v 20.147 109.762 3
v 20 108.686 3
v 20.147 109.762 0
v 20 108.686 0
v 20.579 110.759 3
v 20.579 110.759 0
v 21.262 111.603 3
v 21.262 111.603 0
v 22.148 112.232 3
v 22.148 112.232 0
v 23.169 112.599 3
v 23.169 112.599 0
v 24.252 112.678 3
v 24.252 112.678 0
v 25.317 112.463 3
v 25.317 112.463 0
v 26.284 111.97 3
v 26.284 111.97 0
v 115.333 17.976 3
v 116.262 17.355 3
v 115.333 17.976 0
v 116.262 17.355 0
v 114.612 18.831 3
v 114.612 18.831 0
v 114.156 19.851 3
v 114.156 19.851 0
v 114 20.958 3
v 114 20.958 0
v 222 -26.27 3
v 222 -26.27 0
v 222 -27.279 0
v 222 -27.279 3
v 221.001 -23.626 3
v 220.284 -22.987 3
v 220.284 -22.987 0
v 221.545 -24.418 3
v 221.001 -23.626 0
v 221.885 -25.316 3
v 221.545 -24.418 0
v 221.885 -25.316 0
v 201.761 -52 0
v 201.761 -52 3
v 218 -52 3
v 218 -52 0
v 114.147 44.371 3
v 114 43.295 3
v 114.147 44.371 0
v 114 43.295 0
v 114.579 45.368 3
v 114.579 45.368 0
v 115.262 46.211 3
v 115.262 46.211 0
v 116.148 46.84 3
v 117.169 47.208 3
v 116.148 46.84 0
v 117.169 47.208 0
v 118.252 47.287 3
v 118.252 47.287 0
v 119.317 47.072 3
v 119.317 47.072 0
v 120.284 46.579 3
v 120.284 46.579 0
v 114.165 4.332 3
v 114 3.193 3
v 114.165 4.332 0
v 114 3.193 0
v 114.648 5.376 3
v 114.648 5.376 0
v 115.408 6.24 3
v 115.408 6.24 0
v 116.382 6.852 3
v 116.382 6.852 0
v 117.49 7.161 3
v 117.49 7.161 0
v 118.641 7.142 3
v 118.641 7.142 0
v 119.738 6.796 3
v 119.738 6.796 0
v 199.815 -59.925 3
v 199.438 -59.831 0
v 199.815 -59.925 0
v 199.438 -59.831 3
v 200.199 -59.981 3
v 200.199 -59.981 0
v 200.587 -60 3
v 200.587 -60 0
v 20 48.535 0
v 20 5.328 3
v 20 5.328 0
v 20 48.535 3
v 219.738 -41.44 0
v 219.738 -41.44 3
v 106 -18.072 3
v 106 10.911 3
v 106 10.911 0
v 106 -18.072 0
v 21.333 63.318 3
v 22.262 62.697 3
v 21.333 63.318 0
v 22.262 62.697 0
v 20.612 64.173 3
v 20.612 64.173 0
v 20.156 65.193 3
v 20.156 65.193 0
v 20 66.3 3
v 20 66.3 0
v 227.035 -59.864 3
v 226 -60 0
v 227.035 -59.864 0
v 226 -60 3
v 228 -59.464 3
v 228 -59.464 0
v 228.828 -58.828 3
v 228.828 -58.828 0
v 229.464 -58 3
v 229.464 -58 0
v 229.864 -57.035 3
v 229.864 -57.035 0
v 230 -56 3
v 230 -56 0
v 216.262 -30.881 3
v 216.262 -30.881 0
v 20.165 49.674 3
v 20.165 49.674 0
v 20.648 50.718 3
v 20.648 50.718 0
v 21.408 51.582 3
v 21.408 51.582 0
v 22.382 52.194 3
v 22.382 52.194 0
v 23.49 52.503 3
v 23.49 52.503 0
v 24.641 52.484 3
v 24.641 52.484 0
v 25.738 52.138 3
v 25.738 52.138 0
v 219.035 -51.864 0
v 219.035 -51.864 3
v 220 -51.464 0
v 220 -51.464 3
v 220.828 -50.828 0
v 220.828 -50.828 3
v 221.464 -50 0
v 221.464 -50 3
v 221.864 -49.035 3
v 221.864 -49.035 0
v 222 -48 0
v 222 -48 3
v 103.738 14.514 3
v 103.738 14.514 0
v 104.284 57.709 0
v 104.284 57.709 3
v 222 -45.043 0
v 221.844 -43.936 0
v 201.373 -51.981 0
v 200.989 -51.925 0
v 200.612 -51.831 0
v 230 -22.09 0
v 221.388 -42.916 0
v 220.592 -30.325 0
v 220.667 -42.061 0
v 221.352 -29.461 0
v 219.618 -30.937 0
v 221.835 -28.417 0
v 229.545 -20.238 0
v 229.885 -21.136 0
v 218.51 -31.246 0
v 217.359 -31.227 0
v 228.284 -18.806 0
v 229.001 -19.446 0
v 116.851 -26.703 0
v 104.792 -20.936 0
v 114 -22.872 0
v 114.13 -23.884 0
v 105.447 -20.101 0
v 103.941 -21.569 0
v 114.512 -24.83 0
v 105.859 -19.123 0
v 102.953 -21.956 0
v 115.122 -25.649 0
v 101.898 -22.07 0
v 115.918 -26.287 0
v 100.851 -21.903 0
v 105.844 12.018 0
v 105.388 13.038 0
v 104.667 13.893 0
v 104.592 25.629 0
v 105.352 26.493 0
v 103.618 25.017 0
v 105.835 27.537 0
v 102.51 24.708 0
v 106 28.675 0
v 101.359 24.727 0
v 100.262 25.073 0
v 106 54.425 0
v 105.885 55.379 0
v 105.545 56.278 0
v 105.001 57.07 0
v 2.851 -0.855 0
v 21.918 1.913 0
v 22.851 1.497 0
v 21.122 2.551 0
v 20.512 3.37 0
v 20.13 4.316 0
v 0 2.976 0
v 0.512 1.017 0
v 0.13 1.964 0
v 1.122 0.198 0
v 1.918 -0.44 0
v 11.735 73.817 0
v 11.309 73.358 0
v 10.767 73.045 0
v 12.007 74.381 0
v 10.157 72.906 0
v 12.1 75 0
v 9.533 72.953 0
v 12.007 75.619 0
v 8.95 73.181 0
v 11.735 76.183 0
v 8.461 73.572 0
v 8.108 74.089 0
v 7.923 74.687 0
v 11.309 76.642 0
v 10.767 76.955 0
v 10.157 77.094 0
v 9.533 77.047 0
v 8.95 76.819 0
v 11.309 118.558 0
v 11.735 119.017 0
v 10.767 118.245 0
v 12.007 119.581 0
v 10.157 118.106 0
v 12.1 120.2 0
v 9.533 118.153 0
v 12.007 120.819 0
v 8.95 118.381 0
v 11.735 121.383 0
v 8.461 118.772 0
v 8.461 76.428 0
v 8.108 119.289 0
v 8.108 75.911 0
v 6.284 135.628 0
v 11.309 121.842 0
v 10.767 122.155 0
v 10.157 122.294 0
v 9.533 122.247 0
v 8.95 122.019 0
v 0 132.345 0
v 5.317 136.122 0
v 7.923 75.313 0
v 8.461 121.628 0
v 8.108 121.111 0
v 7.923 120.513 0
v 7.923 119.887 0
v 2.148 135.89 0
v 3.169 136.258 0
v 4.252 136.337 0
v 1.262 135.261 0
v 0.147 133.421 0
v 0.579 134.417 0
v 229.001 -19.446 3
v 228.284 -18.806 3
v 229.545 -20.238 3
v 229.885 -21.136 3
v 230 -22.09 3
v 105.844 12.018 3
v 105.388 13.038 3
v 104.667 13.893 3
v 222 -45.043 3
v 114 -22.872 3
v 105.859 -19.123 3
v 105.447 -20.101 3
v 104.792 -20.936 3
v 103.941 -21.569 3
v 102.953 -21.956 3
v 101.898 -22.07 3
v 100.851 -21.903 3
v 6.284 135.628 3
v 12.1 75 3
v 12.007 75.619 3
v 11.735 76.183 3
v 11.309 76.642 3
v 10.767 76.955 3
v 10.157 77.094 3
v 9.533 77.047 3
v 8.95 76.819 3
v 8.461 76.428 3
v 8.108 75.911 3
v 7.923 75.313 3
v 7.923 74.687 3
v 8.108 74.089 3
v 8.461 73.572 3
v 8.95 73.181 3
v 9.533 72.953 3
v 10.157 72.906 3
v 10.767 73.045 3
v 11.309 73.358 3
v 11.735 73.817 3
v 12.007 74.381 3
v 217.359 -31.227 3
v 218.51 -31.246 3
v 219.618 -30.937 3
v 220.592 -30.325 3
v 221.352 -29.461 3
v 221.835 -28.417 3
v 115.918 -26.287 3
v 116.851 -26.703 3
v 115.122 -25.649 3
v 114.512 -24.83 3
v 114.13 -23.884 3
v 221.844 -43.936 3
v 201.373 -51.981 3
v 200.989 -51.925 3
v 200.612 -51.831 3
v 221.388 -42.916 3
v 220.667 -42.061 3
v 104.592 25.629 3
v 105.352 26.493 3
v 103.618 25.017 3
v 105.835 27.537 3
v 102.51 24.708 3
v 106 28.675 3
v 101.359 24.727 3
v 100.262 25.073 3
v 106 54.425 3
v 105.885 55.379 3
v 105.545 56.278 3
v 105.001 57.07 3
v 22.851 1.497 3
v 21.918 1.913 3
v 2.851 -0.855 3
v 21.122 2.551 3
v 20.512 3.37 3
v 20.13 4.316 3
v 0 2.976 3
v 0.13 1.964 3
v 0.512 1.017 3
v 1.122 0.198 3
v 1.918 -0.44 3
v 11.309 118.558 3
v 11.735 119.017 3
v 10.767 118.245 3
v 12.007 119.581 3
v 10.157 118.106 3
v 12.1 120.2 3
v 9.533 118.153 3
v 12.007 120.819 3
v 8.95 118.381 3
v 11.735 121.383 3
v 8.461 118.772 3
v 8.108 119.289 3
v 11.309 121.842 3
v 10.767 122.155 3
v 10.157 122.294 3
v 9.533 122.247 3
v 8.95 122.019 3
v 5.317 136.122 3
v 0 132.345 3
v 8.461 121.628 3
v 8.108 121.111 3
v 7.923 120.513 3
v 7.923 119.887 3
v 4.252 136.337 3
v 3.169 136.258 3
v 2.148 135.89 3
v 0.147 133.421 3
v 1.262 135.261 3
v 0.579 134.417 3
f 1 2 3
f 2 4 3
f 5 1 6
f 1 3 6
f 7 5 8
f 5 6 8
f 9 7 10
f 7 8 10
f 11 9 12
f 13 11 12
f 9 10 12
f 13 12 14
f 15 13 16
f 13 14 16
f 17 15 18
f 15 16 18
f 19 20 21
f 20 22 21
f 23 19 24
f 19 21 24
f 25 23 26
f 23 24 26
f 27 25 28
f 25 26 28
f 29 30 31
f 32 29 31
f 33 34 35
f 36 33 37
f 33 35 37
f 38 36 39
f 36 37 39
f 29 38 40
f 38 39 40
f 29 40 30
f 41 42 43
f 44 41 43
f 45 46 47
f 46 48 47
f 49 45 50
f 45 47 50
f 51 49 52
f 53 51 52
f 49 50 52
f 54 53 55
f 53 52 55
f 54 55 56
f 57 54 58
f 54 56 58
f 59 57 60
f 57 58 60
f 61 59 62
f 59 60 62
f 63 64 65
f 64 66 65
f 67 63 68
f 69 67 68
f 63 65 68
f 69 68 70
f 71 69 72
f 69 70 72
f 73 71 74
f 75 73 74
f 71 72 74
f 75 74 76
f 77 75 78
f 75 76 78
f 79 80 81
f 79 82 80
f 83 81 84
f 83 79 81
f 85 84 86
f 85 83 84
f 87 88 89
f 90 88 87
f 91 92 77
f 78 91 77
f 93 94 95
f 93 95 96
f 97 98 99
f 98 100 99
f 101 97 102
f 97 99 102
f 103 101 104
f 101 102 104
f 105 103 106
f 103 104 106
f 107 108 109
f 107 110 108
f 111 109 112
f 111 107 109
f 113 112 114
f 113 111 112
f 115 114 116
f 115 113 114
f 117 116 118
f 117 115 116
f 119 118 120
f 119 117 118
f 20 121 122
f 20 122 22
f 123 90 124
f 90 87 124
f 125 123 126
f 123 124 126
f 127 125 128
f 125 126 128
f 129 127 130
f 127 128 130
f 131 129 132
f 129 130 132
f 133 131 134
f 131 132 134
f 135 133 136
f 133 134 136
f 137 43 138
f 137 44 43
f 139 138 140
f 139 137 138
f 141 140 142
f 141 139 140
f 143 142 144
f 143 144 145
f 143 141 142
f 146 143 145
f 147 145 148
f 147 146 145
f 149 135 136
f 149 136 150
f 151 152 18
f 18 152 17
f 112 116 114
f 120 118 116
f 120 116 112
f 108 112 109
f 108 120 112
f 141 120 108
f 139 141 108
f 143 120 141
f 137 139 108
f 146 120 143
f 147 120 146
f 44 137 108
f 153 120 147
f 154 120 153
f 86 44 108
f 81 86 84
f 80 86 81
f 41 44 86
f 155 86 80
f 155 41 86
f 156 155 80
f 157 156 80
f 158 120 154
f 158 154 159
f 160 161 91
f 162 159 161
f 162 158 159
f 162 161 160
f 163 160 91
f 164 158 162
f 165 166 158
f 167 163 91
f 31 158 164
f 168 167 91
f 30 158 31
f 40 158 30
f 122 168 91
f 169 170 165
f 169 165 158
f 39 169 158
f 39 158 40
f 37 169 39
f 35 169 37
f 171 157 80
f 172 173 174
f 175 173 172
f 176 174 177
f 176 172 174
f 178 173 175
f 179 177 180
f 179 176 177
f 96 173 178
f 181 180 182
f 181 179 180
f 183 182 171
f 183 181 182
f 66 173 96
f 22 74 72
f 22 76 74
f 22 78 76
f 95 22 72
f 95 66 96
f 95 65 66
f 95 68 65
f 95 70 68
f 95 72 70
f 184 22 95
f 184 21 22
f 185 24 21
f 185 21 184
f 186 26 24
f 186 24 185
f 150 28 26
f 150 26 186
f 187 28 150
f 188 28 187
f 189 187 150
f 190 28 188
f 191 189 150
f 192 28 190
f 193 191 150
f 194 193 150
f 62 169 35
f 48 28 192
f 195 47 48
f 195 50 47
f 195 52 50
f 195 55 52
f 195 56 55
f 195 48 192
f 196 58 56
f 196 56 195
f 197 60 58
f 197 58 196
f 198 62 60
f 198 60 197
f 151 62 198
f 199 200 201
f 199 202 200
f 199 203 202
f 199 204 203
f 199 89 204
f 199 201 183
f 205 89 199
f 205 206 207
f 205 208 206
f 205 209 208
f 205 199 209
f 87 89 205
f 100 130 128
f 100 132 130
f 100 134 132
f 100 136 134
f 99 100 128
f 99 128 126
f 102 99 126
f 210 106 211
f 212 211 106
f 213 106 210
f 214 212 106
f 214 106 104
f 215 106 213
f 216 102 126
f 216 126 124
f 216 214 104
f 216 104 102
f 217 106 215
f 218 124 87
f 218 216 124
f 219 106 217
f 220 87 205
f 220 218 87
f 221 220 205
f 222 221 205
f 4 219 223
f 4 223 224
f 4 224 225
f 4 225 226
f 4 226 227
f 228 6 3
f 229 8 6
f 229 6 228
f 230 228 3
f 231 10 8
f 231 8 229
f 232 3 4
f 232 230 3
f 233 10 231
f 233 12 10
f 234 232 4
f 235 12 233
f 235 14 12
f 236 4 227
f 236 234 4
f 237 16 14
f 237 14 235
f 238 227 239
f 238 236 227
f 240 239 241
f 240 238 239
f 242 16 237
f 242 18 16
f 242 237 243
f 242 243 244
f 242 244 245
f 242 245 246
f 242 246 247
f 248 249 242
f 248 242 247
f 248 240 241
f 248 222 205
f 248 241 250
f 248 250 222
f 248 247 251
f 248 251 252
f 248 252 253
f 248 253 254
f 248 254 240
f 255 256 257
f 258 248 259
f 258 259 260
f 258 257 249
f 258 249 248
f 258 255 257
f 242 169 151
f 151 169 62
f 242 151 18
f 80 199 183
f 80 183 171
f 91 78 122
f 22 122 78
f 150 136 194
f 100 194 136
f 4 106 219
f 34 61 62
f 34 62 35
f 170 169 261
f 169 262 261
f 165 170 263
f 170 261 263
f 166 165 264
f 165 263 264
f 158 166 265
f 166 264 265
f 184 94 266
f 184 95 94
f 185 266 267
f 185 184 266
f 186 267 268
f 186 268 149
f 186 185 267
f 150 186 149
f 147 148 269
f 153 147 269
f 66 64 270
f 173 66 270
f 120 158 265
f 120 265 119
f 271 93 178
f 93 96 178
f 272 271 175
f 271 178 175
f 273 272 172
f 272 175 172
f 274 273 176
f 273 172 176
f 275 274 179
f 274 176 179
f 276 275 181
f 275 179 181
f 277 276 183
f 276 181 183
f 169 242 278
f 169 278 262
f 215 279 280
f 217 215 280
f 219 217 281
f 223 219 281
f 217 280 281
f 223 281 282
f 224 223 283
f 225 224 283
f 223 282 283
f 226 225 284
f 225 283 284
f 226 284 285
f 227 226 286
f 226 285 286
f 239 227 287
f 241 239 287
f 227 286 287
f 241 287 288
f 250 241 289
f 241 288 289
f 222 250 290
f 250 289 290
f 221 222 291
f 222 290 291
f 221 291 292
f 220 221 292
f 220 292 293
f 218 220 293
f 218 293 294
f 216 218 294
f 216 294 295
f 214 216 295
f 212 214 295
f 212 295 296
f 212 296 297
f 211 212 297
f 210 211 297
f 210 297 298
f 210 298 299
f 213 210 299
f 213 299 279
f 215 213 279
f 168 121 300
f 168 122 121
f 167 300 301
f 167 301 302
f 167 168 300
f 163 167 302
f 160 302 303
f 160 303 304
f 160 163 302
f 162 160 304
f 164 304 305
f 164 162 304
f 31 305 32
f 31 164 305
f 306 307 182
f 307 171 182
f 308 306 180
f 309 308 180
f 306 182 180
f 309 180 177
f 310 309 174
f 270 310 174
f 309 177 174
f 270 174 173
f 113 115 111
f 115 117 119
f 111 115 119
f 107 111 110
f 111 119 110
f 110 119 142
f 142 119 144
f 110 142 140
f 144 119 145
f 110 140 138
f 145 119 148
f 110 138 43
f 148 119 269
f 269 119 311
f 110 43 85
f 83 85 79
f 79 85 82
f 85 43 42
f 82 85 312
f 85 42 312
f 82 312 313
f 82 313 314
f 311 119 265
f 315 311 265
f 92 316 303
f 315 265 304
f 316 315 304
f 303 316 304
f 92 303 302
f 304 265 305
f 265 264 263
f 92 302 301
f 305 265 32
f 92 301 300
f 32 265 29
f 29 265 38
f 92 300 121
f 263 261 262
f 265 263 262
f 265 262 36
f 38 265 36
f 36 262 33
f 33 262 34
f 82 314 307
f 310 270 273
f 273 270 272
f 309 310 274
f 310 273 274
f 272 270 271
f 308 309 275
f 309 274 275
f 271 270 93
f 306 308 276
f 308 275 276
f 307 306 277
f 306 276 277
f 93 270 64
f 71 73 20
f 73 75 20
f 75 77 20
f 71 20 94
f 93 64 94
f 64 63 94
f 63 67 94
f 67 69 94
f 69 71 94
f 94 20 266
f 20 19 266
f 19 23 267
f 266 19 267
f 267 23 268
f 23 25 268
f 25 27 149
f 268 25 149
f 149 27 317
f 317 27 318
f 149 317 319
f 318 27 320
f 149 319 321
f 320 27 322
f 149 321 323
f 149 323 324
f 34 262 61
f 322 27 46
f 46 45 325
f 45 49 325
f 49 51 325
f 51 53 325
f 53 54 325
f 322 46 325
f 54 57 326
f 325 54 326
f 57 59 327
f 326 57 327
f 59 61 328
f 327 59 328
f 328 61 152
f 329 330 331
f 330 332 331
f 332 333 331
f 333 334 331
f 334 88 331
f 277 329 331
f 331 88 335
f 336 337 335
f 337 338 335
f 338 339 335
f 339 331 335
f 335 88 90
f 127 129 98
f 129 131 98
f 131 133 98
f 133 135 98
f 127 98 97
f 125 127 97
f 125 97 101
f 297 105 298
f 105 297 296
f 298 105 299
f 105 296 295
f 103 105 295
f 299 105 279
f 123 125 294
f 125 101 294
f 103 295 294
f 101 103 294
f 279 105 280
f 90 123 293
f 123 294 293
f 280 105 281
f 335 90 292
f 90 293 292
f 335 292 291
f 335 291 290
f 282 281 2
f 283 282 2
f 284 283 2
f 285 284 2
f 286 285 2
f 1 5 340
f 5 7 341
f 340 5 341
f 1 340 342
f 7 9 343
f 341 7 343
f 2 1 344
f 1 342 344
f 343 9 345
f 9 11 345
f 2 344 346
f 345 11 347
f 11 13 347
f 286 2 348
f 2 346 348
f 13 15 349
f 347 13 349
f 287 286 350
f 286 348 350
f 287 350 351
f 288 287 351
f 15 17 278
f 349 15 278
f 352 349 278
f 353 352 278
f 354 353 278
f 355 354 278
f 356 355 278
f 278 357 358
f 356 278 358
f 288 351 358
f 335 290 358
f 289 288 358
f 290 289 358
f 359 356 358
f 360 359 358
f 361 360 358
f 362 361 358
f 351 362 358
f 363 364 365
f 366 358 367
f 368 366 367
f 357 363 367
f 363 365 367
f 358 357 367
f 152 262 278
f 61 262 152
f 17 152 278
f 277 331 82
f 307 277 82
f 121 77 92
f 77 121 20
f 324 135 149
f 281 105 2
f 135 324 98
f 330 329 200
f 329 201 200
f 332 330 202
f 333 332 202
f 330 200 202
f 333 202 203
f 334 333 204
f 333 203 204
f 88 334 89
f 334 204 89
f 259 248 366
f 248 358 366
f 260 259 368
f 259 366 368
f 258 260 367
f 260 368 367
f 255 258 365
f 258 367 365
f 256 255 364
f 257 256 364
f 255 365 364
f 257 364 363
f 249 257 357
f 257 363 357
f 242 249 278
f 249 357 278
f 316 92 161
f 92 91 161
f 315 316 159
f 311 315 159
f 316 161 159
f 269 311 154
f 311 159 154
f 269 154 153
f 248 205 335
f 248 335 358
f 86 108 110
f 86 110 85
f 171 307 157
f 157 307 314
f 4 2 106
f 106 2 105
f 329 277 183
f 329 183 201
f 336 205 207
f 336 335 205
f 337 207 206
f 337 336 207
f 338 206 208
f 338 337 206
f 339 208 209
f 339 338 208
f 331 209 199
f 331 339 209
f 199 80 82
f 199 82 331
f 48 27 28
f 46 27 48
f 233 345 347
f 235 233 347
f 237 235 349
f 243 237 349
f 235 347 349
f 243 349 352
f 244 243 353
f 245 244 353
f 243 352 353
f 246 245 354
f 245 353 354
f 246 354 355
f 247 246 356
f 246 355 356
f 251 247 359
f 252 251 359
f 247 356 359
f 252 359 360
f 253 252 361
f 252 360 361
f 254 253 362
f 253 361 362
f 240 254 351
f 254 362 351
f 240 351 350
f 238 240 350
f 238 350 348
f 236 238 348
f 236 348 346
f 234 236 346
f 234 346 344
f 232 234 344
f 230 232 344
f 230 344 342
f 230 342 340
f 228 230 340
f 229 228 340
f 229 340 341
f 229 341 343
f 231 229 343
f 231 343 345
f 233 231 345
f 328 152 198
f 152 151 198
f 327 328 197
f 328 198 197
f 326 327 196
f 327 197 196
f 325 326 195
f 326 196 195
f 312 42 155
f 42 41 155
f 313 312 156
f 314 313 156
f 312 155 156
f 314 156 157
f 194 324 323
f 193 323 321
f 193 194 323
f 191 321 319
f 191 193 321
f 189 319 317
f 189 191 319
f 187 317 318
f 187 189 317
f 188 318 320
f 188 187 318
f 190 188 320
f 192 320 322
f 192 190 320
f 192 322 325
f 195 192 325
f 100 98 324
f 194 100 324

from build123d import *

# Parameters (mm, degrees)
EXTRUDE_1_DEPTH     = 3
SKETCH_2_R          = 2.1
CUT_EXTRUDE_1_DEPTH = 39
CUT_EXTRUDE_2_DEPTH = 10
FILLET_1_R          = 4
FILLET_2_R          = 4


with BuildPart() as part:
    # Эскиз1 → Бобышка-Вытянуть1 (new body)
    with BuildSketch(Plane.XY):
        Polygon((0, 0), (0, 140), (230, -20), (230, -60), (200, -60), align=None)
    extrude(amount=EXTRUDE_1_DEPTH)

    # Эскиз2 → Вырез-Вытянуть1 (cut)
    with BuildSketch(Plane.XY.offset(3)):
        with Locations((10, 75)):
            Circle(SKETCH_2_R)
        with Locations((10, 120.2)):
            Circle(SKETCH_2_R)
    extrude(amount=-CUT_EXTRUDE_1_DEPTH, mode=Mode.SUBTRACT)

    # Эскиз5 → Вырез-Вытянуть2 (cut)
    with BuildSketch(Plane.XY.offset(3)):
        Polygon((222, -24.180122244), (222, -33.649029765), (114, 18.445995751), (114, 50.950312538), align=None)
        Polygon((20, 63.787962403), (106, 22.304886529), (106, 56.51552993), (20, 116.341616886), align=None)
        Polygon((20, 54.90589969), (106, 13.422823816), (106, -23.447754793), (20, 2.352245207), align=None)
        Polygon((201.17415069, -52), (222, -52), (222, -42.531092479), (114, 9.563933037), (114, -25.847754793), align=None)
    extrude(amount=-CUT_EXTRUDE_2_DEPTH, mode=Mode.SUBTRACT)

    # Скругление1
    fillet_1_edges = [part.edges().sort_by_distance(p)[0] for p in [
        (0, 0, 1.5),
        (0, 140, 1.5),
        (230, -20, 1.5),
        (230, -60, 1.5),
        (200, -60, 1.5),
    ]]
    fillet(fillet_1_edges, radius=FILLET_1_R)

    # Скругление2
    fillet_2_edges = [part.edges().sort_by_distance(p)[0] for p in [
        (20, 2.352245207, 1.5),
        (20, 54.90589969, 1.5),
        (106, 13.422823816, 1.5),
        (106, -23.447754793, 1.5),
        (114, 50.950312538, 1.5),
        (222, -24.180122244, 1.5),
        (222, -33.649029765, 1.5),
        (114, 18.445995751, 1.5),
        (222, -42.531092479, 1.5),
        (222, -52, 1.5),
        (201.17415069, -52, 1.5),
        (114, -25.847754793, 1.5),
        (114, 9.563933037, 1.5),
        (20, 116.341616886, 1.5),
        (106, 56.51552993, 1.5),
        (106, 22.304886529, 1.5),
        (20, 63.787962403, 1.5),
    ]]
    fillet(fillet_2_edges, radius=FILLET_2_R)


solid = part.part
